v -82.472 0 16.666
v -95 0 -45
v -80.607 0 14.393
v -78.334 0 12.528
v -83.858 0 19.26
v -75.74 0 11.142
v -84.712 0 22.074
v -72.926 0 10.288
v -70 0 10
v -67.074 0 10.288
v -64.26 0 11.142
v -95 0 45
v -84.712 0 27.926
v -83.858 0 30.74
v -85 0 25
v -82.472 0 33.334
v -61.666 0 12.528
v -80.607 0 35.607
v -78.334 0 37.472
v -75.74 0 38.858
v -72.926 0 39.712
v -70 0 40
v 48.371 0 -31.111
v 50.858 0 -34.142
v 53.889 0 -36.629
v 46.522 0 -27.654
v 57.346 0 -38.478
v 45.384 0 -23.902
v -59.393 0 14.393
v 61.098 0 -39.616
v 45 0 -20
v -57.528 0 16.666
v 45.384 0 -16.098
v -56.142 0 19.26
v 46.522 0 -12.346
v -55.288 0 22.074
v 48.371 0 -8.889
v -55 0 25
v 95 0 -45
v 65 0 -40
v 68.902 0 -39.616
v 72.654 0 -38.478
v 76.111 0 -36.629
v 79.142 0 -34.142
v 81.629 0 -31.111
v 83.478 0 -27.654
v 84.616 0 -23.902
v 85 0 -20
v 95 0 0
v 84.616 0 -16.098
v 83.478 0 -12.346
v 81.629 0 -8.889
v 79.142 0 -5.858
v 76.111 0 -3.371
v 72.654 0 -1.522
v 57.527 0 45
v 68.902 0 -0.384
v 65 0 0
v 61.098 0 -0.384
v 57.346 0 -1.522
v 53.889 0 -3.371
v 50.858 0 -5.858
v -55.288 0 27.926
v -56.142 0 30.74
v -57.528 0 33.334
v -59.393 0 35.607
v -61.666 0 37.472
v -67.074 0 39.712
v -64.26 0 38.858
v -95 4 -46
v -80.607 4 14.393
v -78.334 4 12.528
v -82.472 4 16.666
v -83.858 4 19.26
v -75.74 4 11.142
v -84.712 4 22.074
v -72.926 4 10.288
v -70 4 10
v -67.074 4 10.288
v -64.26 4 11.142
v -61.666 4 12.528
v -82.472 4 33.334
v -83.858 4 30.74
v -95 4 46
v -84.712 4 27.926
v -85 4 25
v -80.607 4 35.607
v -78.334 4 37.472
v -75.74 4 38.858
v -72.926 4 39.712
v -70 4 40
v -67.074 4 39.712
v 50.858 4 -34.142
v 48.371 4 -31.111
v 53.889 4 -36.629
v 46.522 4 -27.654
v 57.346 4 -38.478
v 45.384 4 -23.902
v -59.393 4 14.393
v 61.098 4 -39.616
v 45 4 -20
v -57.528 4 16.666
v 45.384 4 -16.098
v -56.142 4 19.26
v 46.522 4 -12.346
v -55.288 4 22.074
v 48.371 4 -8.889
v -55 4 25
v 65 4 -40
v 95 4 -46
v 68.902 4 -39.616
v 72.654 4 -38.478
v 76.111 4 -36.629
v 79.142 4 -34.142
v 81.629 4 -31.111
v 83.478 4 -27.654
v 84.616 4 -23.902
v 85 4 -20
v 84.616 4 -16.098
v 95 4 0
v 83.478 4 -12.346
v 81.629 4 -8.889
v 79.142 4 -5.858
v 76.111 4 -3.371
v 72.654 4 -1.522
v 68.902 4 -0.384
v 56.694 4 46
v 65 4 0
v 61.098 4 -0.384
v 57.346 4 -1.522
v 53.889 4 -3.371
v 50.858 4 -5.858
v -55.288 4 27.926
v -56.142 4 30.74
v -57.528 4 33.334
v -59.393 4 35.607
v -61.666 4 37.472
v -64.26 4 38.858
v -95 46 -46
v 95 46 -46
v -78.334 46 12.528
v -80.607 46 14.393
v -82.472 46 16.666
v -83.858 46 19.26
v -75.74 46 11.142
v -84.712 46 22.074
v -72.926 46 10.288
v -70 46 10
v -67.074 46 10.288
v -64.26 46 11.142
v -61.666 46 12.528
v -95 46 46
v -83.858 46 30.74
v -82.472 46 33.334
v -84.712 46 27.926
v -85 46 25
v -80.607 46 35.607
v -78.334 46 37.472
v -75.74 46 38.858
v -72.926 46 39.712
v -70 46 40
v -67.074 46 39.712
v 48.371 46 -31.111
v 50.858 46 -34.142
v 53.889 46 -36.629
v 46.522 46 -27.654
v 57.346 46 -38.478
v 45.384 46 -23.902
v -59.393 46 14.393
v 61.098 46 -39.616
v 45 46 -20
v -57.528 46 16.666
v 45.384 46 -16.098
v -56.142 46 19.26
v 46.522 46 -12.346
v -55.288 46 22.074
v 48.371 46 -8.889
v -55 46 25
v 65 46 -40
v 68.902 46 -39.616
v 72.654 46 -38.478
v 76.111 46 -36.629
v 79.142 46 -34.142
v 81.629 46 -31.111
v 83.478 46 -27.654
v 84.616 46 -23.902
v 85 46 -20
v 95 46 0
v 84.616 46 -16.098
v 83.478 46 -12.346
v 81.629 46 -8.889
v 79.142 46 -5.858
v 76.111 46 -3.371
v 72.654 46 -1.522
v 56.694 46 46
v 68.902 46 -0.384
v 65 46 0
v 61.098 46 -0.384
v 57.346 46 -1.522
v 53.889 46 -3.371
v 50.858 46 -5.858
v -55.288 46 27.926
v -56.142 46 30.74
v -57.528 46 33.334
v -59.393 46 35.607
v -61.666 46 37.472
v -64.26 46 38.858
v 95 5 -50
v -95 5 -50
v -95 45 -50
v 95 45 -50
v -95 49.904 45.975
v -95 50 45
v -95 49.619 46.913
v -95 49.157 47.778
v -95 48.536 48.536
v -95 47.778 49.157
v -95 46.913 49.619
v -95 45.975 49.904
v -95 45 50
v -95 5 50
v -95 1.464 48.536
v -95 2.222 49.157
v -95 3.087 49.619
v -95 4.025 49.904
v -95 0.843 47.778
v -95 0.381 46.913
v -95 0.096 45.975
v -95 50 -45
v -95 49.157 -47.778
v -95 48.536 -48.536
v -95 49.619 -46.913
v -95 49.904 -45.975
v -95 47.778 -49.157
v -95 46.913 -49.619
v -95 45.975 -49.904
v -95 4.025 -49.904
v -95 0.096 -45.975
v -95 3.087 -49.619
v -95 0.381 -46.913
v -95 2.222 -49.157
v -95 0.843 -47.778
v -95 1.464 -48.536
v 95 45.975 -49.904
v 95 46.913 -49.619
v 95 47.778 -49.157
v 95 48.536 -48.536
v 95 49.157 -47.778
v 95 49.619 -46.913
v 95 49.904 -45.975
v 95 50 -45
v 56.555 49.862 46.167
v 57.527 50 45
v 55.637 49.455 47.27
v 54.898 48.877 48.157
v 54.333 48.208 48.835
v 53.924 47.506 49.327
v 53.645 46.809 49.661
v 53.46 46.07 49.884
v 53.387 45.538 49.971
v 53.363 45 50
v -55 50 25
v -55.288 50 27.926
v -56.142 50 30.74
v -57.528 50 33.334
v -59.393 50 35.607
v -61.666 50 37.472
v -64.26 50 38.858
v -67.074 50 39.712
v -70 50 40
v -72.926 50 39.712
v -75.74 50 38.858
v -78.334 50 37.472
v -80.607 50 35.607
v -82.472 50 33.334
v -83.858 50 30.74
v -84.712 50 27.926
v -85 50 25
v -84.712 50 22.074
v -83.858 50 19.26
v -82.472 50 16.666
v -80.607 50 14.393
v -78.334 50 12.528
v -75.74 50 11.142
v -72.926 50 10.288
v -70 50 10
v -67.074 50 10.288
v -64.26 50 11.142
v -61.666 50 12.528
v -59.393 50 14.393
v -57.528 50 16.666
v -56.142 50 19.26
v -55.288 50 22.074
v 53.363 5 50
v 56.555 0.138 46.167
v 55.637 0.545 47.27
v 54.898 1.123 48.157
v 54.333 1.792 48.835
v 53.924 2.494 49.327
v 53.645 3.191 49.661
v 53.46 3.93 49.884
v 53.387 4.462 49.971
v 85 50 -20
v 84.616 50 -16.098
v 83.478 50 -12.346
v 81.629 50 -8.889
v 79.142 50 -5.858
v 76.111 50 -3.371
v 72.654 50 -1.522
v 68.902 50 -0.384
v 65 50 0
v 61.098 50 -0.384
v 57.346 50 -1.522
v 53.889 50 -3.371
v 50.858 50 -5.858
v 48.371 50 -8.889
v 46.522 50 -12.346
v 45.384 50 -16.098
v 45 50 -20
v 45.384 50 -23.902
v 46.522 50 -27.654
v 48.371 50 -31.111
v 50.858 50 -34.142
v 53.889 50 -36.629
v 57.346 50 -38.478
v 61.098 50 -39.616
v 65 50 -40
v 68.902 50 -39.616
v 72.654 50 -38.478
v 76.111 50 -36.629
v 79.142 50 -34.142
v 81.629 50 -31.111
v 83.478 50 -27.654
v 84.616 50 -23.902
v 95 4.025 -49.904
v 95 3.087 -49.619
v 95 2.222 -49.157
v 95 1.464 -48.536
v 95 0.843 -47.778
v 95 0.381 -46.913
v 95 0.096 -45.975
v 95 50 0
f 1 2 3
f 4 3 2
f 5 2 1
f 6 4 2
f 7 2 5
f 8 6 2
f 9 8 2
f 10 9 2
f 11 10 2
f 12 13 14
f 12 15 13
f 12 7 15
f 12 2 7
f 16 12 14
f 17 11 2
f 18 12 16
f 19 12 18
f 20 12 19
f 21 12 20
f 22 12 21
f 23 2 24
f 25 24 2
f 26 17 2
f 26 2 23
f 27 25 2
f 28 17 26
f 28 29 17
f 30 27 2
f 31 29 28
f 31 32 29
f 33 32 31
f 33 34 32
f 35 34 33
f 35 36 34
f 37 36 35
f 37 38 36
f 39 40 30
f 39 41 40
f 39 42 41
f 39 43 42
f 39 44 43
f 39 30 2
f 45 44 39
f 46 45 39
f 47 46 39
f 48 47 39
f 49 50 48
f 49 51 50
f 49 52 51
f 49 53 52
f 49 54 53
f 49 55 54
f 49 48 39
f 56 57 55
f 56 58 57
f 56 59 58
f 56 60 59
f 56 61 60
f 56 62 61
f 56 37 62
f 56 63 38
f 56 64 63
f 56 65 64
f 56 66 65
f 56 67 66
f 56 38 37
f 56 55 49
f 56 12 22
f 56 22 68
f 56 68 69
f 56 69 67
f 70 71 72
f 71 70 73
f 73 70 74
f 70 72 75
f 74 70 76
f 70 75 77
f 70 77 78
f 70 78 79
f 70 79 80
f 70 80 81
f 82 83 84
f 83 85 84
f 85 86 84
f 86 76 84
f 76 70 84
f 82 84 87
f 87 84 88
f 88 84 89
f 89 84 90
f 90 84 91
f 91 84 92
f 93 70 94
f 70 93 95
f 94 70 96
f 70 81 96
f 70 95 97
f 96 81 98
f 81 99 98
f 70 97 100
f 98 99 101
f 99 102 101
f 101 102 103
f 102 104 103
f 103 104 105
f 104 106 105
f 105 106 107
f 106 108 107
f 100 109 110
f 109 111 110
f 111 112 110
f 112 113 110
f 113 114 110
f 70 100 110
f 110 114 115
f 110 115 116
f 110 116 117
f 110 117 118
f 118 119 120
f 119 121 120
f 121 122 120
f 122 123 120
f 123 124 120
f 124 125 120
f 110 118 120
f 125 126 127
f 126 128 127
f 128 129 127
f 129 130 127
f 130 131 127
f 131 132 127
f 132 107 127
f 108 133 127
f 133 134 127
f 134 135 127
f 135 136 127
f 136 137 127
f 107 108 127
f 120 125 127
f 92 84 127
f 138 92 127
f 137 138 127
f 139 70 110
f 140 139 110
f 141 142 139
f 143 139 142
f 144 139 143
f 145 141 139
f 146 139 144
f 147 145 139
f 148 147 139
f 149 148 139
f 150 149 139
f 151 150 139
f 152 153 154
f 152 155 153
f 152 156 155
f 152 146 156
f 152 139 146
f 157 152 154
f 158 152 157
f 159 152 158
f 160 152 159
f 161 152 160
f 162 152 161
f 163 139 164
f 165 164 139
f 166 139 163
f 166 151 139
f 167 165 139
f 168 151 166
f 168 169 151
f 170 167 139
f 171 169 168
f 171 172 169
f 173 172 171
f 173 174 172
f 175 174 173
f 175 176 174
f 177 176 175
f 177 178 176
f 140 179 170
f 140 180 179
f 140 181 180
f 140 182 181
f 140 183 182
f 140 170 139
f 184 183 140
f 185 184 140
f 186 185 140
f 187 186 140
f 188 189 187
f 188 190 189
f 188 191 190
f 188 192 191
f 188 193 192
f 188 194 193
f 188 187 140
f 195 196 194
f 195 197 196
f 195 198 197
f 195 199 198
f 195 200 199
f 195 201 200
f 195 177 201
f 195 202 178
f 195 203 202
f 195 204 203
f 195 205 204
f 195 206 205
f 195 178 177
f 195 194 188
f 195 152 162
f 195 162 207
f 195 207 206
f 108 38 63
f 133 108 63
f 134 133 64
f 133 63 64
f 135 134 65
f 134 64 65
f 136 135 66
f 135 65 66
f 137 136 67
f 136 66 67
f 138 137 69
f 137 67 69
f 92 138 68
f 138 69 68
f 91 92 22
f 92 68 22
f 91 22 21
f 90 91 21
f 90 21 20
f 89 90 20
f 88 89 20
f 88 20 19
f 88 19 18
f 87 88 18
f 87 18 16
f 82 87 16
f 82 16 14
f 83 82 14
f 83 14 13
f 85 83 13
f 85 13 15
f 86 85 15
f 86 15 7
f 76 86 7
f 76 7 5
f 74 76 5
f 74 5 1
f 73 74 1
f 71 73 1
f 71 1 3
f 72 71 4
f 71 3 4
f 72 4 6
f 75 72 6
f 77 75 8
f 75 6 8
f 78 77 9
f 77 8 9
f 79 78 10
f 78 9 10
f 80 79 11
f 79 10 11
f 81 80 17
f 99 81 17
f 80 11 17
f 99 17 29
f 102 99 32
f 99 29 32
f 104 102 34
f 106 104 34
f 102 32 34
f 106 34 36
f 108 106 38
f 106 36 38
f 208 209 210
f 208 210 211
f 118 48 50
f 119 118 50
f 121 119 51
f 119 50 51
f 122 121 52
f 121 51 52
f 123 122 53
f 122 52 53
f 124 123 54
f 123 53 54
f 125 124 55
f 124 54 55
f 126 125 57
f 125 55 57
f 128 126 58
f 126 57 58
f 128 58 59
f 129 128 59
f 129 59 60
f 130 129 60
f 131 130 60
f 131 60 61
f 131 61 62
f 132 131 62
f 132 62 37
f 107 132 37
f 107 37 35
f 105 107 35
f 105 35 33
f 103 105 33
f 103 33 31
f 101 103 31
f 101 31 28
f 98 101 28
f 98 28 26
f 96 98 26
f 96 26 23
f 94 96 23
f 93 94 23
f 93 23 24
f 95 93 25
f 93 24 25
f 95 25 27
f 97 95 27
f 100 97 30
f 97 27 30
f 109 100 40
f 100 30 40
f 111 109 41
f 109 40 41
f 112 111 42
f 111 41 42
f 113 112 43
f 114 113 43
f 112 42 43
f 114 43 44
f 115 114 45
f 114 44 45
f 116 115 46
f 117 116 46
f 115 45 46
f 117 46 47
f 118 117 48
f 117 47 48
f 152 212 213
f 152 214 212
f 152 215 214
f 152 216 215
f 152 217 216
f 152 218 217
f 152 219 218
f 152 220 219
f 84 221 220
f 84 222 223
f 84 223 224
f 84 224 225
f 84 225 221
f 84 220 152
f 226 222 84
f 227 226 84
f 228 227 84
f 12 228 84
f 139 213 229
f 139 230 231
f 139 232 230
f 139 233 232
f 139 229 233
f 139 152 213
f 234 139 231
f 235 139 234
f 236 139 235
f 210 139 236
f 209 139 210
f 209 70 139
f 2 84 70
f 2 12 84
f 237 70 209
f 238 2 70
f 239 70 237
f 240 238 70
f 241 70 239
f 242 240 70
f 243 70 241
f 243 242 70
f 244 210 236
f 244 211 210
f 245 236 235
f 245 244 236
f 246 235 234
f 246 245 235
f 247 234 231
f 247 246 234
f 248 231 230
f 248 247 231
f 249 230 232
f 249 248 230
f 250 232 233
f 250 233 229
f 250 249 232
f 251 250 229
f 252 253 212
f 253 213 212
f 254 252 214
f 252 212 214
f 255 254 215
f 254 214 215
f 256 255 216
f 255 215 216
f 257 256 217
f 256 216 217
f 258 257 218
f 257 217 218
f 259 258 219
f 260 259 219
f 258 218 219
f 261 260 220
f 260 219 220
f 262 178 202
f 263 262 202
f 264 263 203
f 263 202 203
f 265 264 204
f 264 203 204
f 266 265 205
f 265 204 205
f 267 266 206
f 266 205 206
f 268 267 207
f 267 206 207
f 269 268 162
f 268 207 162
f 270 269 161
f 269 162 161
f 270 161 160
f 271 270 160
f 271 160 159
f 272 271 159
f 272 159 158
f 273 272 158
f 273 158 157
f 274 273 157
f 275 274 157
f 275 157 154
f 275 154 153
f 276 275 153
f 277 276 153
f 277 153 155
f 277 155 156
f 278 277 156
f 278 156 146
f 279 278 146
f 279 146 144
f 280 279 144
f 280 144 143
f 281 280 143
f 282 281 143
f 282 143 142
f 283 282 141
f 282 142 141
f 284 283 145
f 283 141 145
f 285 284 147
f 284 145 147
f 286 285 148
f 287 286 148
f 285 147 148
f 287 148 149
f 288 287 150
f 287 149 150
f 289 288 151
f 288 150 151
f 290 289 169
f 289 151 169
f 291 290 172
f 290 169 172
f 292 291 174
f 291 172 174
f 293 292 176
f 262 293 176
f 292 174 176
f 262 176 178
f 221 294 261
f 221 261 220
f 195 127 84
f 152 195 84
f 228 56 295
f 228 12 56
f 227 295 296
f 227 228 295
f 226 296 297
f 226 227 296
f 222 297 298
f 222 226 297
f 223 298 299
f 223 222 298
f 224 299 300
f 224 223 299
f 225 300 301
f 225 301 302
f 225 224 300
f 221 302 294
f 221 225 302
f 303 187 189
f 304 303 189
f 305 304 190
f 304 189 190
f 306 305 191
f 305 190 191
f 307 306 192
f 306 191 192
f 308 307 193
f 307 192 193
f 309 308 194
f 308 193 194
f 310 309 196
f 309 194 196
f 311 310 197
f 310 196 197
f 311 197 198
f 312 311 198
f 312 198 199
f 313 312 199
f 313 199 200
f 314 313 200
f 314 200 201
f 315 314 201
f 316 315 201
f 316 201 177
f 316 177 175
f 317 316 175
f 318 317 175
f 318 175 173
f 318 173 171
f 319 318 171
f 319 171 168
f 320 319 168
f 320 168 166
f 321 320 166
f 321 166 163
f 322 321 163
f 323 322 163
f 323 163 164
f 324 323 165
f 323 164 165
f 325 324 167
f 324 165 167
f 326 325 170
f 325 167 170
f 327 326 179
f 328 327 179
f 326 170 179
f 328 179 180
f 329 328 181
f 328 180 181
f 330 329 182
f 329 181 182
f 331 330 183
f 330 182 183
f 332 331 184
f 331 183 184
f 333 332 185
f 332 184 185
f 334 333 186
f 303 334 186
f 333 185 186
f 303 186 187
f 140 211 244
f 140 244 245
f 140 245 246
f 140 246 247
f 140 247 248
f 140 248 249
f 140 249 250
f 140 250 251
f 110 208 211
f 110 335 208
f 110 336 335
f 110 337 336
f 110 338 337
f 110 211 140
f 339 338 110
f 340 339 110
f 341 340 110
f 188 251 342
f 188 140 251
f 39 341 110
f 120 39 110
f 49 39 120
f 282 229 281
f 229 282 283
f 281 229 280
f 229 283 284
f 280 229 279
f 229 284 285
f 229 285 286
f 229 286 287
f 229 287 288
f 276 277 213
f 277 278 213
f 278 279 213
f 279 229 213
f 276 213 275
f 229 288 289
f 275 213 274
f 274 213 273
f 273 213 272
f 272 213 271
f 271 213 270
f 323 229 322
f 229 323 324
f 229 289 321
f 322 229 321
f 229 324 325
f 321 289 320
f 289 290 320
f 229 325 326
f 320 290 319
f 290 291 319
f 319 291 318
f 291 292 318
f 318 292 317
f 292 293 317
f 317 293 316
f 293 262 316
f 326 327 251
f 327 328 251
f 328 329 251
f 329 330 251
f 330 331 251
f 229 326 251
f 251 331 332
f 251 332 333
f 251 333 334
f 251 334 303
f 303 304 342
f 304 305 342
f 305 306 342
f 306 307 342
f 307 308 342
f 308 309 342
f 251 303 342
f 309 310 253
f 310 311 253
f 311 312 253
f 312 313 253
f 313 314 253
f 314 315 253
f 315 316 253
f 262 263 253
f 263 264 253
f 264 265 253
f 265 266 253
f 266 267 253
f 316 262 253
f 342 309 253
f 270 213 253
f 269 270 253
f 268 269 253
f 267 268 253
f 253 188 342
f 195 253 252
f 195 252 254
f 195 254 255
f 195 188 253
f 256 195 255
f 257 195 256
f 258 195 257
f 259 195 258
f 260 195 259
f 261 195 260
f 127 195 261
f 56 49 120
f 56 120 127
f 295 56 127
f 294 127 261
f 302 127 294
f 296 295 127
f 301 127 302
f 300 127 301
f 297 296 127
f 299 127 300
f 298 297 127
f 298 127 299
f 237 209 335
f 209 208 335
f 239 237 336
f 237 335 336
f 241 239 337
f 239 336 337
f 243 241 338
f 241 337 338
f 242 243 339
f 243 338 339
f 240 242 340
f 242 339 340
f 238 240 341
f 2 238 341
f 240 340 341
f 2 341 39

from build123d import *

# Parameters (mm, degrees)
F1_DEPTH = 50
F2_T     = -4
F3_R     = 15
F3_R_2   = 20
F4_DEPTH = 50.001
F5_R     = 5


with BuildPart() as f1:
    # F0 (on Front) → F1 (new body)
    with BuildSketch(Plane.XZ):
        Polygon((-95, -50), (95, -50), (95, 0), (53.363256, 50), (-95, 50), align=None)
    extrude(amount=-F1_DEPTH)

    # F2
    f2_openings = [f1.faces().sort_by_distance(p)[0] for p in [
        (-95, 25, 0),
        (95, 25, -25),
        (74.181628, 25, 25),
    ]]
    offset(amount=F2_T, openings=f2_openings)

    # F3 (on Front) → F4 (cut, through all)
    with BuildSketch(Plane.XZ):
        with Locations((-70, 25)):
            Circle(F3_R)
        with Locations((65, -20)):
            Circle(F3_R_2)
    extrude(amount=-F4_DEPTH, mode=Mode.SUBTRACT)

    # F5
    f5_edges = [f1.edges().sort_by_distance(p)[0] for p in [
        (-20.818372, 0, 50),
        (-20.818372, 50, 50),
        (0, 0, -50),
        (0, 50, -50),
    ]]
    fillet(f5_edges, radius=F5_R)


solid = f1.part
